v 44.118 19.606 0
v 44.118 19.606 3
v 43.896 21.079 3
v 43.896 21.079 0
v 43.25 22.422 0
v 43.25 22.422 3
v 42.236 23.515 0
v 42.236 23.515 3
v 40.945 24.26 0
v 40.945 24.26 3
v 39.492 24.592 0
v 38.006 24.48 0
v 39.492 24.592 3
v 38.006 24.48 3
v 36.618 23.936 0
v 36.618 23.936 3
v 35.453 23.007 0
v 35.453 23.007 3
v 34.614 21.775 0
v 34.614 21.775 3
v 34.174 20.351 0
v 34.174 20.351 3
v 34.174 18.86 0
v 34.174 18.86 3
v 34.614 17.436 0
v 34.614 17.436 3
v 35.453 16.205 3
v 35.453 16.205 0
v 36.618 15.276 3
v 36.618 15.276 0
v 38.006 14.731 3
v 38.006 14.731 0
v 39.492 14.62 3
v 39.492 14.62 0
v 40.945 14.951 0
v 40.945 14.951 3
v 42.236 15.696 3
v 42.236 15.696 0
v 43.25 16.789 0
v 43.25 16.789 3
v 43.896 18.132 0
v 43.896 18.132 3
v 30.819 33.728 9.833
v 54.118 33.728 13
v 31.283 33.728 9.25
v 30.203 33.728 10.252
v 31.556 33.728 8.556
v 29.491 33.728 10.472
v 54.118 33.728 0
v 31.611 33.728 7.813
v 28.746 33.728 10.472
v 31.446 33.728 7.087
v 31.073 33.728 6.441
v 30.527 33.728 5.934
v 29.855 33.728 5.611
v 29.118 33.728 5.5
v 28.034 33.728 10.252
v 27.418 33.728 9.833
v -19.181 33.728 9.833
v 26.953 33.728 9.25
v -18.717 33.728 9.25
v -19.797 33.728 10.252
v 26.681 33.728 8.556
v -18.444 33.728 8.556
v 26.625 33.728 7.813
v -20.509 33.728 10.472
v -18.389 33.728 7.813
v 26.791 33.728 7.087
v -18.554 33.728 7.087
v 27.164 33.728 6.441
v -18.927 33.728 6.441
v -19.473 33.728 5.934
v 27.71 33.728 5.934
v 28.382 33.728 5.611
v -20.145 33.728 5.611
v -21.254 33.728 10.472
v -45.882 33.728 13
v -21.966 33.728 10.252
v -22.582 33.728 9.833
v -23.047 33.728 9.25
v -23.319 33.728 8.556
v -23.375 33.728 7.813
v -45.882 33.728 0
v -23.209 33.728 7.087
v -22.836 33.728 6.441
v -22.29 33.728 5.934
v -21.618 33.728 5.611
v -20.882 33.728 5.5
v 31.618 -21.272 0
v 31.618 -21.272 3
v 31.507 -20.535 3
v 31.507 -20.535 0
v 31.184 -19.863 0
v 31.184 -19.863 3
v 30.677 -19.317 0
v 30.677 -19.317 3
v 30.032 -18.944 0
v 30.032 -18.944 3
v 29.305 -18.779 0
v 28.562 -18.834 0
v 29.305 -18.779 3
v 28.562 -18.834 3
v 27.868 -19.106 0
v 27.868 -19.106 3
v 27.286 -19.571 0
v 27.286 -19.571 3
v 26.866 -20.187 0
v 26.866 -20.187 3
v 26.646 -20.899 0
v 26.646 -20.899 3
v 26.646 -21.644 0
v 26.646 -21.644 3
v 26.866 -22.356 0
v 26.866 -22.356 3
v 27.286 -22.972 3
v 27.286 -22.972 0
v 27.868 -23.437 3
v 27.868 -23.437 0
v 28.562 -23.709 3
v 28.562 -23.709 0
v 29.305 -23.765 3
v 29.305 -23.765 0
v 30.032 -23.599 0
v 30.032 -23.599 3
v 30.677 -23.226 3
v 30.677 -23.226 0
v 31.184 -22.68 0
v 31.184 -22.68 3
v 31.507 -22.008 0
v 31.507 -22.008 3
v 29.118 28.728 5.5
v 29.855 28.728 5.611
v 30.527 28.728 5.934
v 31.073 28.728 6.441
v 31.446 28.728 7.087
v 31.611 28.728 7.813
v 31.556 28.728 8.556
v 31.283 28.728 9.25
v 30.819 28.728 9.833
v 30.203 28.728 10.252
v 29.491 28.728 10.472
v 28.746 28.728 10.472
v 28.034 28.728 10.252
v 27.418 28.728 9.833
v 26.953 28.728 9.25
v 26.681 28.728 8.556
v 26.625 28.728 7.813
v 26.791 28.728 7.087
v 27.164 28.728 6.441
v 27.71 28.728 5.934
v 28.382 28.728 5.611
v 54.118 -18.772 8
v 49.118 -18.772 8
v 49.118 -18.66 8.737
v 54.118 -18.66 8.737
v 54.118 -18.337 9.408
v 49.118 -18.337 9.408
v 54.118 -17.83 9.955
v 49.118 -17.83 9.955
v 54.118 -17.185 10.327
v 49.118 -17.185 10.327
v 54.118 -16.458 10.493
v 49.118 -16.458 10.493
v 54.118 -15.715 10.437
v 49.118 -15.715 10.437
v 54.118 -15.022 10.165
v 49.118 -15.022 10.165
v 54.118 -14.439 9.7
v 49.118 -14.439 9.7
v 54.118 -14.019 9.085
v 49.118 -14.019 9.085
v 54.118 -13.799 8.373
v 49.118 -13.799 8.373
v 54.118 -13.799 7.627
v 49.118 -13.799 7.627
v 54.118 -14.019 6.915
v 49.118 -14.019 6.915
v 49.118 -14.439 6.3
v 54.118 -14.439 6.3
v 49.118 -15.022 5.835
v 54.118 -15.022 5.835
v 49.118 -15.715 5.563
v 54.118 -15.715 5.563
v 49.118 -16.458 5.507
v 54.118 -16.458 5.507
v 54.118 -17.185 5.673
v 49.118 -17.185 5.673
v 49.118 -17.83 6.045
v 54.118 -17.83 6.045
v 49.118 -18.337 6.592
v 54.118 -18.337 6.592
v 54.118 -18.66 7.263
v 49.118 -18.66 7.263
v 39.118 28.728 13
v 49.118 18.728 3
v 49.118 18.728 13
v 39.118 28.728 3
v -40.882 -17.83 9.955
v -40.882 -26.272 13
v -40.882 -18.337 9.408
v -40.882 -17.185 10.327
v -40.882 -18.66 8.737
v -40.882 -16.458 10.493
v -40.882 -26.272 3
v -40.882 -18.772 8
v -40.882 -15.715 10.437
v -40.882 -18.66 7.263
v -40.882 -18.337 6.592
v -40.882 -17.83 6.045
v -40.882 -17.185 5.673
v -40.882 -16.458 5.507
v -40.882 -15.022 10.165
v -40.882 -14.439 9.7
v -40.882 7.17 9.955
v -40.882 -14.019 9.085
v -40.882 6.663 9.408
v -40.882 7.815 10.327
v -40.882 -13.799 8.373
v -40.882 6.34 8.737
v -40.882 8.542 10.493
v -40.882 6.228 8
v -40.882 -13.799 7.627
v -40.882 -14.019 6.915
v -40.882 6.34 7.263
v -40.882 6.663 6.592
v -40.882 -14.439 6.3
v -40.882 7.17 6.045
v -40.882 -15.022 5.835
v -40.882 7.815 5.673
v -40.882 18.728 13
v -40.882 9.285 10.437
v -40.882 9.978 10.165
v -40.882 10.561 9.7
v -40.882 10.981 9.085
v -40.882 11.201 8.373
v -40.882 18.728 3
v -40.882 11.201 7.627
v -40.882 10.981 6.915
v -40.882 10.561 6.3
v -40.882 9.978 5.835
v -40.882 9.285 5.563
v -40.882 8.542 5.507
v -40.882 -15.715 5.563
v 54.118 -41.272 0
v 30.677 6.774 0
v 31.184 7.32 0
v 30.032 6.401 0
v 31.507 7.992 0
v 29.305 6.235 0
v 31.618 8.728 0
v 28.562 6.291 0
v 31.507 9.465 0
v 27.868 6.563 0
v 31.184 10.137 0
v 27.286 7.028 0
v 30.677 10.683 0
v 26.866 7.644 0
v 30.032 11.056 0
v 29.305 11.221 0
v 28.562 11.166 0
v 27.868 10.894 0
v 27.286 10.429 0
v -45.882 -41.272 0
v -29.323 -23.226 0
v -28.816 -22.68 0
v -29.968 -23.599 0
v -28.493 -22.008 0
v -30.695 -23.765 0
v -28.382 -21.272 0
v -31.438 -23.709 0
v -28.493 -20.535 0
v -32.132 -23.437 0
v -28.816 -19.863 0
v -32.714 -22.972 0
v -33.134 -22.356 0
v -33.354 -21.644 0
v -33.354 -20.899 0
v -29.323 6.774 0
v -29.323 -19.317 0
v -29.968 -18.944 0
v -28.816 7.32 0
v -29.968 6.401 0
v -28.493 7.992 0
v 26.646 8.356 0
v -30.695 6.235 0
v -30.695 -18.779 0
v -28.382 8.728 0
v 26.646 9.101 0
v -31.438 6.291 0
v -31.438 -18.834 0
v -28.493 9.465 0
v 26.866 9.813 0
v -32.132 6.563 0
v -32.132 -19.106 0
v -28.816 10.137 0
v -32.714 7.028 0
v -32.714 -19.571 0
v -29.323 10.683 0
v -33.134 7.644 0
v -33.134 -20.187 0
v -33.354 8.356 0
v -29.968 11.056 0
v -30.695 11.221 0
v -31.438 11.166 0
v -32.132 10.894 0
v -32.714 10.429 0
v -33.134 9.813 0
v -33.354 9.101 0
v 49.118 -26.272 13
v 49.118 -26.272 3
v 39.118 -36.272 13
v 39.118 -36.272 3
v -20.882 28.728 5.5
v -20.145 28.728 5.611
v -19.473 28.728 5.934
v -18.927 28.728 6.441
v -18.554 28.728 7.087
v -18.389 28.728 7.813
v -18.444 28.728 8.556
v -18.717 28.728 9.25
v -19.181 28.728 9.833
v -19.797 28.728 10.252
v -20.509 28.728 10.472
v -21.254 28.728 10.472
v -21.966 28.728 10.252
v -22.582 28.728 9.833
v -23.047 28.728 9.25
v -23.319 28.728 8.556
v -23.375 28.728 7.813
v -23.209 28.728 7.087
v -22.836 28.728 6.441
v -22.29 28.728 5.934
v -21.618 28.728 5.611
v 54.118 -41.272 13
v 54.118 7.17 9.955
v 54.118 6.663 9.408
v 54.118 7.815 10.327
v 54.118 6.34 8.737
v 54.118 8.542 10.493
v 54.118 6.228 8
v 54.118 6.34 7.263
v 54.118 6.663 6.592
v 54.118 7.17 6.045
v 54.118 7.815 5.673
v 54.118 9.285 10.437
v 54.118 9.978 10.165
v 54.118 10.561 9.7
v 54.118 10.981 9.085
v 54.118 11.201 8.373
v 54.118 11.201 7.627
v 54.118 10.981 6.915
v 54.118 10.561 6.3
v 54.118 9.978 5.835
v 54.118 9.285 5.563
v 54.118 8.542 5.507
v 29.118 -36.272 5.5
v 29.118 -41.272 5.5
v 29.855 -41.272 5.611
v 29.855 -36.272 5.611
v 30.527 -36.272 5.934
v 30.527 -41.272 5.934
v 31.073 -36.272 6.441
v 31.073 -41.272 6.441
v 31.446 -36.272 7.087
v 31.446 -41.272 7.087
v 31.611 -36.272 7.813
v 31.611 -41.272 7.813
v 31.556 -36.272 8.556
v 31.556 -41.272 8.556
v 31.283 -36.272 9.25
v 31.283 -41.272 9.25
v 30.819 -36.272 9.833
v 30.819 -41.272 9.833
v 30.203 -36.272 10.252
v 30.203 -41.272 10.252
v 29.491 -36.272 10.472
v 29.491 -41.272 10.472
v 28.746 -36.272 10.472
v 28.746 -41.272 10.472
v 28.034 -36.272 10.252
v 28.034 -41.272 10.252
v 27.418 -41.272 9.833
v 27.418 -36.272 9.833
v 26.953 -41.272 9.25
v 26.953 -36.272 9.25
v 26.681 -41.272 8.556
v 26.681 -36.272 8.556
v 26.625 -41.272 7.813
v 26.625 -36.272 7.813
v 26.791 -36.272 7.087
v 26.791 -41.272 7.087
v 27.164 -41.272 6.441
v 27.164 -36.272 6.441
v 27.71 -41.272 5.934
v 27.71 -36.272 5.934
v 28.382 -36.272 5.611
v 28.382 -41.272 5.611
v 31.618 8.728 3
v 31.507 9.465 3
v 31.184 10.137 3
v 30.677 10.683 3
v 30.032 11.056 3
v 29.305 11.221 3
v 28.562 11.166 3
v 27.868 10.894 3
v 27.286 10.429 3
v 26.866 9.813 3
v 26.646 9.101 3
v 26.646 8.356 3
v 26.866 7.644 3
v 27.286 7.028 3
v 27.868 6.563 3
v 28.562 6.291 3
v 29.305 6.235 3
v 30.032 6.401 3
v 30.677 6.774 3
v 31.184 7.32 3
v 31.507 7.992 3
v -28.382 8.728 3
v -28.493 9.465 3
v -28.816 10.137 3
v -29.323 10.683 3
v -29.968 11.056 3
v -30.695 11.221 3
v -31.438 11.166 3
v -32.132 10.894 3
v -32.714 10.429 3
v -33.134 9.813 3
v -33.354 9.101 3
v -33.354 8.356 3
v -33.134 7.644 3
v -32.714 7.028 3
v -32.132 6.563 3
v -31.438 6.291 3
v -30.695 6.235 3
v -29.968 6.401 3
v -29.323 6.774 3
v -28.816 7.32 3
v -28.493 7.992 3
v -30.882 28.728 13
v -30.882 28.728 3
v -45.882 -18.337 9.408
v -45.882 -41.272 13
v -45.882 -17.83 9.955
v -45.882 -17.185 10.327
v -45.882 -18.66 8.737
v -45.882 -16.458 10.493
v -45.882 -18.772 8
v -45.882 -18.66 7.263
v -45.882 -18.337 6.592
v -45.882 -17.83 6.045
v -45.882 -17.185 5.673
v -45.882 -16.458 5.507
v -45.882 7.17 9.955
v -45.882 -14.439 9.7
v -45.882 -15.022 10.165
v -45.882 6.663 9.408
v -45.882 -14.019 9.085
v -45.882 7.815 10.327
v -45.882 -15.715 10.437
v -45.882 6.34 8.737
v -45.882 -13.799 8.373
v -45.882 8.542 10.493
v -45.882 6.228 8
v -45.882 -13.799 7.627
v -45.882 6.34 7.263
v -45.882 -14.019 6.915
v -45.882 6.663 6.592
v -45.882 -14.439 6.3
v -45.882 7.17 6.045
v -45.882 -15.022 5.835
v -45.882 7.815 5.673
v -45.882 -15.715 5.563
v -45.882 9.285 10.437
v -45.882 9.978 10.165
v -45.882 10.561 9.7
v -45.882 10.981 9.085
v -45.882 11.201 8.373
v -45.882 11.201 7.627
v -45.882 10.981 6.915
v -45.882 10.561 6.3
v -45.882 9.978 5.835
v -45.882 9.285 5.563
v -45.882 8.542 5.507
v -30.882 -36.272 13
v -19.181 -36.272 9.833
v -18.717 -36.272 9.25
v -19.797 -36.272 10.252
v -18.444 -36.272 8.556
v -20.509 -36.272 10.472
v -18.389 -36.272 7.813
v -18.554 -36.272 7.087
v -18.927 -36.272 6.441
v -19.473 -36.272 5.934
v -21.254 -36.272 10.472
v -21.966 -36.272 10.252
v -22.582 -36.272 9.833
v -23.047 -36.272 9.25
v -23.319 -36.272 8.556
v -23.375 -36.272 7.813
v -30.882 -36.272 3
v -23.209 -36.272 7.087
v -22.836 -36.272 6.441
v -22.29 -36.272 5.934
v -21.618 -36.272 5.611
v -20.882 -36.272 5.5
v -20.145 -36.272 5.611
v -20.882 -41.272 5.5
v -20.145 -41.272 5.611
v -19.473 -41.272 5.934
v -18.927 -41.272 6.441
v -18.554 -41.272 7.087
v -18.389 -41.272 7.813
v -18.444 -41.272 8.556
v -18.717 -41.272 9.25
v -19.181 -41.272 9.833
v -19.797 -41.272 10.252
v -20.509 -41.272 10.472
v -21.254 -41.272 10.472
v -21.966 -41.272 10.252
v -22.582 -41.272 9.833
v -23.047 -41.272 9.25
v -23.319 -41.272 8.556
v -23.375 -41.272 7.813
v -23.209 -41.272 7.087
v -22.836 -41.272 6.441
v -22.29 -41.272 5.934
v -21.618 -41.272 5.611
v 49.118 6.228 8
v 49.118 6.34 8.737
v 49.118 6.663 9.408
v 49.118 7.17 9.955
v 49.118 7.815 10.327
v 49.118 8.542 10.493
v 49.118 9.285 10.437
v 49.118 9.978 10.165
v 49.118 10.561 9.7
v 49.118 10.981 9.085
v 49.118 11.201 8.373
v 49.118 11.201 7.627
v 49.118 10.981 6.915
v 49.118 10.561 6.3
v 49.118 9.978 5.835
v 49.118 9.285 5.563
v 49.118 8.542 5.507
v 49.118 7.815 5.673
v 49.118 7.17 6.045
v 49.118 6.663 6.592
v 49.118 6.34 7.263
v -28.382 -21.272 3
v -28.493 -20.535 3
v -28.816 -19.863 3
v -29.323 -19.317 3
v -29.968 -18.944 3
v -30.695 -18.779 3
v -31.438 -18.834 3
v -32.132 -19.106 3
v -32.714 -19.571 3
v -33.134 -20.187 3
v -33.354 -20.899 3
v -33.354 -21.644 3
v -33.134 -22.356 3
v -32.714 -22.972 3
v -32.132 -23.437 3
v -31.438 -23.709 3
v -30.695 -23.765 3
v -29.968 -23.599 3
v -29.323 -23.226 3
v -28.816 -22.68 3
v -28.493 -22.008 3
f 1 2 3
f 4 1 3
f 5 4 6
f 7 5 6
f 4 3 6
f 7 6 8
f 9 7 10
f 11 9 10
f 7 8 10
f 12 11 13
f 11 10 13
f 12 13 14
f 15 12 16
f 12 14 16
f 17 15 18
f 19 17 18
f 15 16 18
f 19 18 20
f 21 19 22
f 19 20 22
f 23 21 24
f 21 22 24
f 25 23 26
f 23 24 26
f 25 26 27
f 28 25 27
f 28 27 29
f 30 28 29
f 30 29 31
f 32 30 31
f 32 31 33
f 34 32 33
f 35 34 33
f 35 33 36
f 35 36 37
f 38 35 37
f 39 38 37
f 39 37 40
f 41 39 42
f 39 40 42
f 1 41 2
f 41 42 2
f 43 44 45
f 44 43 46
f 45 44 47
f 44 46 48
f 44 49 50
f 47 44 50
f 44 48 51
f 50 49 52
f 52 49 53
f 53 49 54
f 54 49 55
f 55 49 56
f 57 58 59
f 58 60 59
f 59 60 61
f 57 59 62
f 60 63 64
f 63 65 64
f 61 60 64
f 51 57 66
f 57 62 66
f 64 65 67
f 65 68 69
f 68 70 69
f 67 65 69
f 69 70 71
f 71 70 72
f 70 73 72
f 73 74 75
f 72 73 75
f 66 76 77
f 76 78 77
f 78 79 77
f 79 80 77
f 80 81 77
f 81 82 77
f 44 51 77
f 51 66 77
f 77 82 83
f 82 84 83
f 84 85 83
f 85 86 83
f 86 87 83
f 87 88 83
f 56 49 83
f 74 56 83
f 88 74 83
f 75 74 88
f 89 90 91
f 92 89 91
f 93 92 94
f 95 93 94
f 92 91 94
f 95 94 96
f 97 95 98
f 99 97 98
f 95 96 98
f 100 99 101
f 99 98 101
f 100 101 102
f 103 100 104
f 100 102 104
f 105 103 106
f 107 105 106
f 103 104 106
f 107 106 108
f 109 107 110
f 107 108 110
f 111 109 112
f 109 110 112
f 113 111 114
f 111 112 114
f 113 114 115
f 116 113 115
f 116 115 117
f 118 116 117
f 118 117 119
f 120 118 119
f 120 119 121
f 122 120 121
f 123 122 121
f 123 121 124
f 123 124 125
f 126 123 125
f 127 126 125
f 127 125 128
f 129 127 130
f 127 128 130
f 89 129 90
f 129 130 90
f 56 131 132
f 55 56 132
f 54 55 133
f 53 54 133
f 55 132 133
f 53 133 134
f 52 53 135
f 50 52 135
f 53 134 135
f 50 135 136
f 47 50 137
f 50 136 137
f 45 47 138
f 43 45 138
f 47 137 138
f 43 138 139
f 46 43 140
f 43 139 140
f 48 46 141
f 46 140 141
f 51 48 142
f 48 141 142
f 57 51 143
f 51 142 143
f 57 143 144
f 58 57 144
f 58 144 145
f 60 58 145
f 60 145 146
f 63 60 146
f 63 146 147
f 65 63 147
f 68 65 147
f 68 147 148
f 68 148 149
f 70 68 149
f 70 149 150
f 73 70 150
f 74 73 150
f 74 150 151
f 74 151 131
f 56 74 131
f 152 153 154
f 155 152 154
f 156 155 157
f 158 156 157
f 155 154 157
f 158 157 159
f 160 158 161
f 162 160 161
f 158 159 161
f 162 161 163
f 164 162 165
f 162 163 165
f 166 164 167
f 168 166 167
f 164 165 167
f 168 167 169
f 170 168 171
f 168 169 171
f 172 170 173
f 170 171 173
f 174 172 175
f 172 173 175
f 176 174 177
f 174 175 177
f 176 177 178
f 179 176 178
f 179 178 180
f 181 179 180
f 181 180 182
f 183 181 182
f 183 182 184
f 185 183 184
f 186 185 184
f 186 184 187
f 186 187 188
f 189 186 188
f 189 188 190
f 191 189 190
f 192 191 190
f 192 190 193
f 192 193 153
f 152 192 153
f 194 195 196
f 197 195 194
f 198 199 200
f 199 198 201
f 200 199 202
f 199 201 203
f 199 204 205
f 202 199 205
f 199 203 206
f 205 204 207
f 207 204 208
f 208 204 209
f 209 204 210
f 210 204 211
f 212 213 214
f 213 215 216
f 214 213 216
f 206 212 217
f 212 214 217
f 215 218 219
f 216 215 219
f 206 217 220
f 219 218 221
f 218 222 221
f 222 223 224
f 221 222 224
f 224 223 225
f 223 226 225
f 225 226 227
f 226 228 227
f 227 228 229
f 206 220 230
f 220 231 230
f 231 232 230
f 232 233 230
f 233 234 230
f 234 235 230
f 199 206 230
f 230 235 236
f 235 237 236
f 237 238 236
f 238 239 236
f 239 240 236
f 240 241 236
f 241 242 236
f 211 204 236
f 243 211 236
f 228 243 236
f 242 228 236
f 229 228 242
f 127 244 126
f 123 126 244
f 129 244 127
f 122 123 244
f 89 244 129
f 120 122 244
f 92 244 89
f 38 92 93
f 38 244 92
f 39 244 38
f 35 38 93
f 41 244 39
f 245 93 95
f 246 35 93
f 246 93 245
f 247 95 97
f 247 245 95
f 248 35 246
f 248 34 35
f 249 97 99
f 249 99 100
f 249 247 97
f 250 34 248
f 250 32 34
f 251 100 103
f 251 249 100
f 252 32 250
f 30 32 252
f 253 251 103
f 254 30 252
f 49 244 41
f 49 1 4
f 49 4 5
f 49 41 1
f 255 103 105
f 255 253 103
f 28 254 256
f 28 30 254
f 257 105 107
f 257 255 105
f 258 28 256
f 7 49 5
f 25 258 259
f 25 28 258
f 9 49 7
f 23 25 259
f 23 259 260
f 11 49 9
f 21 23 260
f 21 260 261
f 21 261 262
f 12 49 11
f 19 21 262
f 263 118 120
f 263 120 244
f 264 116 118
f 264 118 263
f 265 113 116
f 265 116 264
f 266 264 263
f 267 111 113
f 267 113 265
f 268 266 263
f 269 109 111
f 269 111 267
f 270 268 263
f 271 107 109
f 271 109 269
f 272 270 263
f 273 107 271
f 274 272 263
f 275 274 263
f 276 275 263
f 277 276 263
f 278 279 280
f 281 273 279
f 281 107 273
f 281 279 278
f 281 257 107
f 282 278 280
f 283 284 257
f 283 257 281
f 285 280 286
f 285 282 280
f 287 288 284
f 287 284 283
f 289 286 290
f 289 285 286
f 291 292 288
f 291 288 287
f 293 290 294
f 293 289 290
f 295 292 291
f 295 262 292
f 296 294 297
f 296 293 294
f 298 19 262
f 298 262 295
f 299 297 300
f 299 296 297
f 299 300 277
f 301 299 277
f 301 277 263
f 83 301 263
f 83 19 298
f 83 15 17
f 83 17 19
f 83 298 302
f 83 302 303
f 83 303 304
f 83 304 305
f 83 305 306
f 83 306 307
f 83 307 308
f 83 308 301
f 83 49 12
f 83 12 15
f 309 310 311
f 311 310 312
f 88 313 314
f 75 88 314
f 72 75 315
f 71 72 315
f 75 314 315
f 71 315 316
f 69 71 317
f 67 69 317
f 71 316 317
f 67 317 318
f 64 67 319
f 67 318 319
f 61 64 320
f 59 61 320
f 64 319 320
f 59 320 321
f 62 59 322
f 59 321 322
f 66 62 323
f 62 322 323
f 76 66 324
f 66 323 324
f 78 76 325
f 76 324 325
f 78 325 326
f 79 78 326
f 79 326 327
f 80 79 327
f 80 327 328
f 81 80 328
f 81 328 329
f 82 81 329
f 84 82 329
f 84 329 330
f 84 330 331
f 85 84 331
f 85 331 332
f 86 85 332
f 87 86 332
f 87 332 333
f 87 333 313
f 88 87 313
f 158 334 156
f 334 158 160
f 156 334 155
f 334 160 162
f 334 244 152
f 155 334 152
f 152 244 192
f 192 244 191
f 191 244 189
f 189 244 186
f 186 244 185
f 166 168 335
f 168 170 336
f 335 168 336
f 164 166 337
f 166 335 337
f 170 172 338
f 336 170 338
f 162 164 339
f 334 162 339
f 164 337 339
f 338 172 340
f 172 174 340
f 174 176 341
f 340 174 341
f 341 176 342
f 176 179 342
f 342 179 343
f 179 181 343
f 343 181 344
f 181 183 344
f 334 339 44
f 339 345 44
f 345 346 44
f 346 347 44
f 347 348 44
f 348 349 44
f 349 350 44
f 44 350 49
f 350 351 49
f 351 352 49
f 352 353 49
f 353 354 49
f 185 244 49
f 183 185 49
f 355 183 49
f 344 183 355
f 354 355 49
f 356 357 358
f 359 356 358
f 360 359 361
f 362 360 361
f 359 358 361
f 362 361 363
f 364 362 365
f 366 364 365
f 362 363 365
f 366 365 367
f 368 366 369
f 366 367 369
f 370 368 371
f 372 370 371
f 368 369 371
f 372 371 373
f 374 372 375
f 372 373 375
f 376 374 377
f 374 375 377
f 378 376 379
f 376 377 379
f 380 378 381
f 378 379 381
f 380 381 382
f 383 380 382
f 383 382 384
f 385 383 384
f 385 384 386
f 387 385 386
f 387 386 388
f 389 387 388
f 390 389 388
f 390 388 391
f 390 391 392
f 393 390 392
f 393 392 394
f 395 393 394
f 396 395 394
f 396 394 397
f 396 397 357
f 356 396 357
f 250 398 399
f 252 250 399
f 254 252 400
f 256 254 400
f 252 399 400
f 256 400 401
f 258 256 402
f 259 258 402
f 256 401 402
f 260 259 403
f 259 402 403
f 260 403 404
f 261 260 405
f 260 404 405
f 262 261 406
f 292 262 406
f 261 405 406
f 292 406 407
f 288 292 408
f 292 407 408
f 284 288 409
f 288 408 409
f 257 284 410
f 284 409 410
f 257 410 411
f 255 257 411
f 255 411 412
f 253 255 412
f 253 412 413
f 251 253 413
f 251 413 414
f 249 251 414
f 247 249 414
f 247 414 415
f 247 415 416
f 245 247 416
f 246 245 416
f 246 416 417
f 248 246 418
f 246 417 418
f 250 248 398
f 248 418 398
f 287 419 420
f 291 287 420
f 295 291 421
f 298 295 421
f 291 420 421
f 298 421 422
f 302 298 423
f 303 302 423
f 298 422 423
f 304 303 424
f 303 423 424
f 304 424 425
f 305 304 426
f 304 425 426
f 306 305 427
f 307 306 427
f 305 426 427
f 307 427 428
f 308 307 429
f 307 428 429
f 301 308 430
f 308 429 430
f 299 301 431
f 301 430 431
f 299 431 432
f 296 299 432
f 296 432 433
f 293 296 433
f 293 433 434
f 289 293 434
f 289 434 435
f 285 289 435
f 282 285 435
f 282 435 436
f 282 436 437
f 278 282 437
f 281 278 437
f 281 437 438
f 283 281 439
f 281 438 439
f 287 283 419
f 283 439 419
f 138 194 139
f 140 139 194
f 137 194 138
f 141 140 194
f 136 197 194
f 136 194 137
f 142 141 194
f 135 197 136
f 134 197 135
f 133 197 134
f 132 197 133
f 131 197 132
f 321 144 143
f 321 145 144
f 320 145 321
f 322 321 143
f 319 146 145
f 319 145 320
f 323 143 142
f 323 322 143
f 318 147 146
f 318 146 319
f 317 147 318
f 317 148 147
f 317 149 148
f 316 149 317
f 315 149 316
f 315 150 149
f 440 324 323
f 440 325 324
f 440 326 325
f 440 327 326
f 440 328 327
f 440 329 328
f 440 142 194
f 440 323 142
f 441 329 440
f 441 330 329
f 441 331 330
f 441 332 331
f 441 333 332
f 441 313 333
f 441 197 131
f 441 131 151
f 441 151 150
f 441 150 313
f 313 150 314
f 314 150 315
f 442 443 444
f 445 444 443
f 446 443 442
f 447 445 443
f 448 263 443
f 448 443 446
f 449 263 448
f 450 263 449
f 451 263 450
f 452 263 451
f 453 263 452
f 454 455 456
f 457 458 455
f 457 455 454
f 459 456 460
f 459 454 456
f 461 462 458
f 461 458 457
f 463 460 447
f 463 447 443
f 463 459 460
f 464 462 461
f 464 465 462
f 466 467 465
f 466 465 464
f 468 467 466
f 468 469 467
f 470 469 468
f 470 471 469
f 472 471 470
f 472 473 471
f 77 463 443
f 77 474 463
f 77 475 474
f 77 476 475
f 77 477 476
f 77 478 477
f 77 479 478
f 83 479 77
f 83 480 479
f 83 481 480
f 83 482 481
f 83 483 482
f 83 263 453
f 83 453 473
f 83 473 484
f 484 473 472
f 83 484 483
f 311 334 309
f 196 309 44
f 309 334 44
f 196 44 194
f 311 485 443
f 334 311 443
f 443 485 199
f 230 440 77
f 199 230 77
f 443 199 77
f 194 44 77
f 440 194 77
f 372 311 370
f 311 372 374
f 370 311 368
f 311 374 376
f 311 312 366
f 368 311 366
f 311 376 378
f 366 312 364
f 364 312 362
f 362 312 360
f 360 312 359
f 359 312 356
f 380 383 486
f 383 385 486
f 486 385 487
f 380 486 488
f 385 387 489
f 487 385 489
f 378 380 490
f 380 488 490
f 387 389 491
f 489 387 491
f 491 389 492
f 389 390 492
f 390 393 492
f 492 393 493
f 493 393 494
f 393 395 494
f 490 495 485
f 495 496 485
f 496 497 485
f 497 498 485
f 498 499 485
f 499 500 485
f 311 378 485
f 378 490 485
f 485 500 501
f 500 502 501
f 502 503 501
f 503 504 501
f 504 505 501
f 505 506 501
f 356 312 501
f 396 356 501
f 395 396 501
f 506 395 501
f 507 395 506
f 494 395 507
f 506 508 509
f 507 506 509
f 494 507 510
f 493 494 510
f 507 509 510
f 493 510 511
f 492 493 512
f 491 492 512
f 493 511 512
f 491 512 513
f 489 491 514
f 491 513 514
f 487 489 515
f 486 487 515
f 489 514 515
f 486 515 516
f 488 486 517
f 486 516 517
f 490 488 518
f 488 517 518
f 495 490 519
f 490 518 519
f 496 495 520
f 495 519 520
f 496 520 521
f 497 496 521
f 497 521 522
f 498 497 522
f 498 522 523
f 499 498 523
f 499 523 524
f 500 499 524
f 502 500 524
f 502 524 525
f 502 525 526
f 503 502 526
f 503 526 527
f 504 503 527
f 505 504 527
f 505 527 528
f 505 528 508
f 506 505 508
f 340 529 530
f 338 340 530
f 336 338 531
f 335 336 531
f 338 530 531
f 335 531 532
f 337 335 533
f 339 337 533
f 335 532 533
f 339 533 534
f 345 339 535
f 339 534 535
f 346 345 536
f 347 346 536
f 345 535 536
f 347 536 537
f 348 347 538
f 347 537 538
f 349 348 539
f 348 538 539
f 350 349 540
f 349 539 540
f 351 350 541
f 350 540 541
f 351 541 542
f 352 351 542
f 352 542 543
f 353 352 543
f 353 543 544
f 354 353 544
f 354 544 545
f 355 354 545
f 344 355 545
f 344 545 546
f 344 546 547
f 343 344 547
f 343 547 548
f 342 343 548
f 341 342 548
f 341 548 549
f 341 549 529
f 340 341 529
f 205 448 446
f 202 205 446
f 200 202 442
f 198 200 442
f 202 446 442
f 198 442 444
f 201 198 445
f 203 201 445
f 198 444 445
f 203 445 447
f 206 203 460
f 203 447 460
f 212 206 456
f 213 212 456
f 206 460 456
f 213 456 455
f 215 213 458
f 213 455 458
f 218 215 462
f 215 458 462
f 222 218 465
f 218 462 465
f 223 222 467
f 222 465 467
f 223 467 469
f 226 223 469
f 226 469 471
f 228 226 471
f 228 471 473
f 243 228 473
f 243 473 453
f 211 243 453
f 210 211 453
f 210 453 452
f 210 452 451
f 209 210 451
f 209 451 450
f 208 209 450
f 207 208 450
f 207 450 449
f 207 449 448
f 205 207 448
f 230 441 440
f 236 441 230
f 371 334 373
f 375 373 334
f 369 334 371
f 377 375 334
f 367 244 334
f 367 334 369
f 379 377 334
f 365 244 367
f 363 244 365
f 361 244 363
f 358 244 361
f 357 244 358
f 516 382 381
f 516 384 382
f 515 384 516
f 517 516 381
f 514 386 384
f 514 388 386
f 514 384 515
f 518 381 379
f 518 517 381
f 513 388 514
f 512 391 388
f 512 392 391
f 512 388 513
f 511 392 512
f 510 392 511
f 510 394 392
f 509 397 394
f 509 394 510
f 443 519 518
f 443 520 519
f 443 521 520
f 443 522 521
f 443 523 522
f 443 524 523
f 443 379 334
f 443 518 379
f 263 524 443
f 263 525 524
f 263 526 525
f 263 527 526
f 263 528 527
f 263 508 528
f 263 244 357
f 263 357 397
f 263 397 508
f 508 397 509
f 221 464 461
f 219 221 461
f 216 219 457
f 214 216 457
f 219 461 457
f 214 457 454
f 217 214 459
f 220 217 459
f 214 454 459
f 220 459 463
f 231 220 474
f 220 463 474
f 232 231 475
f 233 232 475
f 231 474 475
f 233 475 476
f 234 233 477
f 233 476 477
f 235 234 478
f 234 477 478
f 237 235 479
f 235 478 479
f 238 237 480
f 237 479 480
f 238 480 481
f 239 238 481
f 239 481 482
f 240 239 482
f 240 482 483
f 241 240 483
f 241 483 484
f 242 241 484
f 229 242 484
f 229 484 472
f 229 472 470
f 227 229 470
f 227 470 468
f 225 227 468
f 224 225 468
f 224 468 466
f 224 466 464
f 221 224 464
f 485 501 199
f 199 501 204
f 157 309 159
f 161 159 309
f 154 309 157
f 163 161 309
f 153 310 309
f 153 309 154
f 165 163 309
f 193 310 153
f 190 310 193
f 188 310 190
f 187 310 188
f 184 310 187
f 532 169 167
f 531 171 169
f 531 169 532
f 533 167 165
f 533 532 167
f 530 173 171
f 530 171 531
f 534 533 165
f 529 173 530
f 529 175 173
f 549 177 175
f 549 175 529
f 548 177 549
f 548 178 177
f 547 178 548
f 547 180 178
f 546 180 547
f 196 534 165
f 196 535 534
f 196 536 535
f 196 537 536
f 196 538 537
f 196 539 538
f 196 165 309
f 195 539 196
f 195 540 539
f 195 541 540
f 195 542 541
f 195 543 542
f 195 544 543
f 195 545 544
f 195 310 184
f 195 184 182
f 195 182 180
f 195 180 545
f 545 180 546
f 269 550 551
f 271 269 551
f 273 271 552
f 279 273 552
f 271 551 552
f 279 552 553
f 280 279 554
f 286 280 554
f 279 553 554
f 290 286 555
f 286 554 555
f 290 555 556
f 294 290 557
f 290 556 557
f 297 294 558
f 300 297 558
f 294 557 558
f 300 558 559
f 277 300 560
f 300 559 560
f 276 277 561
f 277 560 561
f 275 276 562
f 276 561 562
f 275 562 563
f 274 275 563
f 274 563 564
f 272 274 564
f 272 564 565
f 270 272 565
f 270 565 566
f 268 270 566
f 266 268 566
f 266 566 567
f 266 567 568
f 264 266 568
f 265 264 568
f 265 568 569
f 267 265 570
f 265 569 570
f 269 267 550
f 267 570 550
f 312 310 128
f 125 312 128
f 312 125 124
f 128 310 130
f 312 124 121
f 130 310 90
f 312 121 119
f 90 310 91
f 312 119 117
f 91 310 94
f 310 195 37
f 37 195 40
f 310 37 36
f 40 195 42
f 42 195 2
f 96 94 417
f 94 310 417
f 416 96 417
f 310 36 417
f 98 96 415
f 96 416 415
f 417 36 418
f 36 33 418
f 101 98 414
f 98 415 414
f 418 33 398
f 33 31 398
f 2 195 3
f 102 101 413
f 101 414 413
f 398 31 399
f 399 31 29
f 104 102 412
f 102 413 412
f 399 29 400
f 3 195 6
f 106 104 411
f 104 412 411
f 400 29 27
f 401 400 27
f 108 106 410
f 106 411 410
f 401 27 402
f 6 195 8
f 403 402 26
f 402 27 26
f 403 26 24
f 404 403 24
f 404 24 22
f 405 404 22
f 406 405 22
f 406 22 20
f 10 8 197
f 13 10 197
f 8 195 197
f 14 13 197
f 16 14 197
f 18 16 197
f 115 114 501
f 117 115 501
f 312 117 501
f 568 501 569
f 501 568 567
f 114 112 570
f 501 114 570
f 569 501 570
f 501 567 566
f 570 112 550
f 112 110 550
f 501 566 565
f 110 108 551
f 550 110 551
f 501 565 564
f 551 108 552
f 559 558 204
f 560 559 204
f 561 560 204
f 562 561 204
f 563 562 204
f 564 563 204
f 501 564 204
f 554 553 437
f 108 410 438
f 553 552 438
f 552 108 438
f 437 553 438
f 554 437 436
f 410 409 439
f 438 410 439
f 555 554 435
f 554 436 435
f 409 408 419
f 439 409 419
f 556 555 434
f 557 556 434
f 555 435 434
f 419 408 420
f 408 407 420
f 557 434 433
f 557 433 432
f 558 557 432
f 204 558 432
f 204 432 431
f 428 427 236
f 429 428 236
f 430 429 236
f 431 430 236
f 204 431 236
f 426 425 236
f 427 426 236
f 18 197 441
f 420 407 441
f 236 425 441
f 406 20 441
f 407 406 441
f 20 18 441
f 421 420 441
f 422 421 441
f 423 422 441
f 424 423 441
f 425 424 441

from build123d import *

# Parameters (mm, degrees)
BOSS_EXTRU_1_DEPTH        = 13
COQUE1_T                  = -5
COQUE1_THICKNESS_2_FACE_W = 90
COQUE1_THICKNESS_2_FACE_H = 65
COQUE1_THICKNESS_2_DEPTH  = 2
ENL_V_MAT_EXTRU_1_REACH   = 110.96
ESQUISSE2_R               = 2.5
ENL_V_MAT_EXTRU_2_REACH   = 95.396
ESQUISSE3_R               = 2.5
BOSS_EXTRU_2_DEPTH        = 10
ESQUISSE6_R               = 2.5
ESQUISSE6_R_2             = 5
ENL_V_MAT_EXTRU_3_DEPTH   = 3


with BuildPart() as part:
    # Esquisse1 → Boss.-Extru.1 (new body)
    with BuildSketch(Plane.XY):
        Polygon((44.118436308, 33.728448276), (54.118436308, 33.728448276), (54.118436308, 23.728448276), (54.118436308, -41.271551724), (-45.881563692, -41.271551724), (-45.881563692, 33.728448276), align=None)
    extrude(amount=BOSS_EXTRU_1_DEPTH)

    # Coque1
    coque1_openings = [part.faces().sort_by_distance(p)[0] for p in [
        (4.118436308, -3.771551724, 13),
    ]]
    offset(amount=COQUE1_T, openings=coque1_openings, kind=Kind.INTERSECTION)

    # Coque1 thickness 2 face (on inner face of the shell) → Coque1 thickness 2 (cut)
    with BuildSketch(Plane(origin=(4.118436308, -3.771551724, 5), x_dir=(-1, 0, 0), z_dir=(0, 0, -1))):
        Rectangle(COQUE1_THICKNESS_2_FACE_W, COQUE1_THICKNESS_2_FACE_H)
    extrude(amount=COQUE1_THICKNESS_2_DEPTH, mode=Mode.SUBTRACT)

    # Enlèv. mat.-Extru.1: up to this face of the body (flat: up to its plane)
    enl_v_mat_extru_1_end = Plane(part.part.faces().sort_by_distance((54.118436308, -3.771551724, 6.5))[0])
    # Esquisse2 → Enlèv. mat.-Extru.1 (cut, up to the picked face)
    with BuildSketch(Plane.ZY.offset(45.881563692), mode=Mode.PRIVATE) as enl_v_mat_extru_1_sk1:
        with Locations(Location((8, -16.271551724, 0), (0, 0, 270))):
            Circle(ESQUISSE2_R)
    enl_v_mat_extru_1_tool1 = split(extrude(enl_v_mat_extru_1_sk1.sketch, amount=-ENL_V_MAT_EXTRU_1_REACH, mode=Mode.PRIVATE), bisect_by=enl_v_mat_extru_1_end, keep=Keep.BOTH, mode=Mode.PRIVATE)
    # Esquisse2 → Enlèv. mat.-Extru.1 (cut, up to the picked face)
    with BuildSketch(Plane.ZY.offset(45.881563692), mode=Mode.PRIVATE) as enl_v_mat_extru_1_sk2:
        with Locations(Location((8, 8.728448276, 0), (0, 0, 270))):
            Circle(ESQUISSE2_R)
    enl_v_mat_extru_1_tool2 = split(extrude(enl_v_mat_extru_1_sk2.sketch, amount=-ENL_V_MAT_EXTRU_1_REACH, mode=Mode.PRIVATE), bisect_by=enl_v_mat_extru_1_end, keep=Keep.BOTH, mode=Mode.PRIVATE)
    add(enl_v_mat_extru_1_tool1.solids().sort_by(Axis((-45.881564, -16.271552, 8), (1, 0, 0)))[0], mode=Mode.SUBTRACT)
    add(enl_v_mat_extru_1_tool2.solids().sort_by(Axis((-45.881564, 8.728448, 8), (1, 0, 0)))[0], mode=Mode.SUBTRACT)

    # Enlèv. mat.-Extru.2: up to this face of the body (flat: up to its plane)
    enl_v_mat_extru_2_end = Plane(part.part.faces().sort_by_distance((4.118436308, 33.728448276, 6.5))[0])
    # Esquisse3 → Enlèv. mat.-Extru.2 (cut, up to the picked face)
    with BuildSketch(Plane.XZ.offset(41.271551724), mode=Mode.PRIVATE) as enl_v_mat_extru_2_sk1:
        with Locations(Location((-20.881563692, 8, 0), (0, 0, 270))):
            Circle(ESQUISSE3_R)
    enl_v_mat_extru_2_tool1 = split(extrude(enl_v_mat_extru_2_sk1.sketch, amount=-ENL_V_MAT_EXTRU_2_REACH, mode=Mode.PRIVATE), bisect_by=enl_v_mat_extru_2_end, keep=Keep.BOTH, mode=Mode.PRIVATE)
    # Esquisse3 → Enlèv. mat.-Extru.2 (cut, up to the picked face)
    with BuildSketch(Plane.XZ.offset(41.271551724), mode=Mode.PRIVATE) as enl_v_mat_extru_2_sk2:
        with Locations(Location((29.118436308, 8, 0), (0, 0, 270))):
            Circle(ESQUISSE3_R)
    enl_v_mat_extru_2_tool2 = split(extrude(enl_v_mat_extru_2_sk2.sketch, amount=-ENL_V_MAT_EXTRU_2_REACH, mode=Mode.PRIVATE), bisect_by=enl_v_mat_extru_2_end, keep=Keep.BOTH, mode=Mode.PRIVATE)
    add(enl_v_mat_extru_2_tool1.solids().sort_by(Axis((-20.881564, -41.271552, 8), (0, 1, 0)))[0], mode=Mode.SUBTRACT)
    add(enl_v_mat_extru_2_tool2.solids().sort_by(Axis((29.118436, -41.271552, 8), (0, 1, 0)))[0], mode=Mode.SUBTRACT)

    # Esquisse4 → Boss.-Extru.2 (add)
    with BuildSketch(Plane.XY.offset(3)):
        Polygon((-30.881563692, 28.728448276), (-40.881563692, 18.728448276), (-40.881563692, 28.728448276), align=None)
        Polygon((49.118436308, 28.728448276), (49.118436308, 18.728448276), (39.118436308, 28.728448276), align=None)
        Polygon((49.118436308, -36.271551724), (49.118436308, -26.271551724), (39.118436308, -36.271551724), align=None)
        Polygon((-30.881563692, -36.271551724), (-40.881563692, -26.271551724), (-40.881563692, -36.271551724), align=None)
    extrude(amount=BOSS_EXTRU_2_DEPTH)

    # Esquisse6 → Enlèv. mat.-Extru.3 (cut)
    with BuildSketch(Plane.XY.offset(3)):
        with Locations((-30.881563692, -21.271551724)):
            Circle(ESQUISSE6_R)
        with Locations((29.118436308, -21.271551724)):
            Circle(ESQUISSE6_R)
        with Locations((-30.881563692, 8.728448276)):
            Circle(ESQUISSE6_R)
        with Locations((29.118436308, 8.728448276)):
            Circle(ESQUISSE6_R)
        with Locations((39.118436308, 19.605642263)):
            Circle(ESQUISSE6_R_2)
    extrude(amount=-ENL_V_MAT_EXTRU_3_DEPTH, mode=Mode.SUBTRACT)


solid = part.part
